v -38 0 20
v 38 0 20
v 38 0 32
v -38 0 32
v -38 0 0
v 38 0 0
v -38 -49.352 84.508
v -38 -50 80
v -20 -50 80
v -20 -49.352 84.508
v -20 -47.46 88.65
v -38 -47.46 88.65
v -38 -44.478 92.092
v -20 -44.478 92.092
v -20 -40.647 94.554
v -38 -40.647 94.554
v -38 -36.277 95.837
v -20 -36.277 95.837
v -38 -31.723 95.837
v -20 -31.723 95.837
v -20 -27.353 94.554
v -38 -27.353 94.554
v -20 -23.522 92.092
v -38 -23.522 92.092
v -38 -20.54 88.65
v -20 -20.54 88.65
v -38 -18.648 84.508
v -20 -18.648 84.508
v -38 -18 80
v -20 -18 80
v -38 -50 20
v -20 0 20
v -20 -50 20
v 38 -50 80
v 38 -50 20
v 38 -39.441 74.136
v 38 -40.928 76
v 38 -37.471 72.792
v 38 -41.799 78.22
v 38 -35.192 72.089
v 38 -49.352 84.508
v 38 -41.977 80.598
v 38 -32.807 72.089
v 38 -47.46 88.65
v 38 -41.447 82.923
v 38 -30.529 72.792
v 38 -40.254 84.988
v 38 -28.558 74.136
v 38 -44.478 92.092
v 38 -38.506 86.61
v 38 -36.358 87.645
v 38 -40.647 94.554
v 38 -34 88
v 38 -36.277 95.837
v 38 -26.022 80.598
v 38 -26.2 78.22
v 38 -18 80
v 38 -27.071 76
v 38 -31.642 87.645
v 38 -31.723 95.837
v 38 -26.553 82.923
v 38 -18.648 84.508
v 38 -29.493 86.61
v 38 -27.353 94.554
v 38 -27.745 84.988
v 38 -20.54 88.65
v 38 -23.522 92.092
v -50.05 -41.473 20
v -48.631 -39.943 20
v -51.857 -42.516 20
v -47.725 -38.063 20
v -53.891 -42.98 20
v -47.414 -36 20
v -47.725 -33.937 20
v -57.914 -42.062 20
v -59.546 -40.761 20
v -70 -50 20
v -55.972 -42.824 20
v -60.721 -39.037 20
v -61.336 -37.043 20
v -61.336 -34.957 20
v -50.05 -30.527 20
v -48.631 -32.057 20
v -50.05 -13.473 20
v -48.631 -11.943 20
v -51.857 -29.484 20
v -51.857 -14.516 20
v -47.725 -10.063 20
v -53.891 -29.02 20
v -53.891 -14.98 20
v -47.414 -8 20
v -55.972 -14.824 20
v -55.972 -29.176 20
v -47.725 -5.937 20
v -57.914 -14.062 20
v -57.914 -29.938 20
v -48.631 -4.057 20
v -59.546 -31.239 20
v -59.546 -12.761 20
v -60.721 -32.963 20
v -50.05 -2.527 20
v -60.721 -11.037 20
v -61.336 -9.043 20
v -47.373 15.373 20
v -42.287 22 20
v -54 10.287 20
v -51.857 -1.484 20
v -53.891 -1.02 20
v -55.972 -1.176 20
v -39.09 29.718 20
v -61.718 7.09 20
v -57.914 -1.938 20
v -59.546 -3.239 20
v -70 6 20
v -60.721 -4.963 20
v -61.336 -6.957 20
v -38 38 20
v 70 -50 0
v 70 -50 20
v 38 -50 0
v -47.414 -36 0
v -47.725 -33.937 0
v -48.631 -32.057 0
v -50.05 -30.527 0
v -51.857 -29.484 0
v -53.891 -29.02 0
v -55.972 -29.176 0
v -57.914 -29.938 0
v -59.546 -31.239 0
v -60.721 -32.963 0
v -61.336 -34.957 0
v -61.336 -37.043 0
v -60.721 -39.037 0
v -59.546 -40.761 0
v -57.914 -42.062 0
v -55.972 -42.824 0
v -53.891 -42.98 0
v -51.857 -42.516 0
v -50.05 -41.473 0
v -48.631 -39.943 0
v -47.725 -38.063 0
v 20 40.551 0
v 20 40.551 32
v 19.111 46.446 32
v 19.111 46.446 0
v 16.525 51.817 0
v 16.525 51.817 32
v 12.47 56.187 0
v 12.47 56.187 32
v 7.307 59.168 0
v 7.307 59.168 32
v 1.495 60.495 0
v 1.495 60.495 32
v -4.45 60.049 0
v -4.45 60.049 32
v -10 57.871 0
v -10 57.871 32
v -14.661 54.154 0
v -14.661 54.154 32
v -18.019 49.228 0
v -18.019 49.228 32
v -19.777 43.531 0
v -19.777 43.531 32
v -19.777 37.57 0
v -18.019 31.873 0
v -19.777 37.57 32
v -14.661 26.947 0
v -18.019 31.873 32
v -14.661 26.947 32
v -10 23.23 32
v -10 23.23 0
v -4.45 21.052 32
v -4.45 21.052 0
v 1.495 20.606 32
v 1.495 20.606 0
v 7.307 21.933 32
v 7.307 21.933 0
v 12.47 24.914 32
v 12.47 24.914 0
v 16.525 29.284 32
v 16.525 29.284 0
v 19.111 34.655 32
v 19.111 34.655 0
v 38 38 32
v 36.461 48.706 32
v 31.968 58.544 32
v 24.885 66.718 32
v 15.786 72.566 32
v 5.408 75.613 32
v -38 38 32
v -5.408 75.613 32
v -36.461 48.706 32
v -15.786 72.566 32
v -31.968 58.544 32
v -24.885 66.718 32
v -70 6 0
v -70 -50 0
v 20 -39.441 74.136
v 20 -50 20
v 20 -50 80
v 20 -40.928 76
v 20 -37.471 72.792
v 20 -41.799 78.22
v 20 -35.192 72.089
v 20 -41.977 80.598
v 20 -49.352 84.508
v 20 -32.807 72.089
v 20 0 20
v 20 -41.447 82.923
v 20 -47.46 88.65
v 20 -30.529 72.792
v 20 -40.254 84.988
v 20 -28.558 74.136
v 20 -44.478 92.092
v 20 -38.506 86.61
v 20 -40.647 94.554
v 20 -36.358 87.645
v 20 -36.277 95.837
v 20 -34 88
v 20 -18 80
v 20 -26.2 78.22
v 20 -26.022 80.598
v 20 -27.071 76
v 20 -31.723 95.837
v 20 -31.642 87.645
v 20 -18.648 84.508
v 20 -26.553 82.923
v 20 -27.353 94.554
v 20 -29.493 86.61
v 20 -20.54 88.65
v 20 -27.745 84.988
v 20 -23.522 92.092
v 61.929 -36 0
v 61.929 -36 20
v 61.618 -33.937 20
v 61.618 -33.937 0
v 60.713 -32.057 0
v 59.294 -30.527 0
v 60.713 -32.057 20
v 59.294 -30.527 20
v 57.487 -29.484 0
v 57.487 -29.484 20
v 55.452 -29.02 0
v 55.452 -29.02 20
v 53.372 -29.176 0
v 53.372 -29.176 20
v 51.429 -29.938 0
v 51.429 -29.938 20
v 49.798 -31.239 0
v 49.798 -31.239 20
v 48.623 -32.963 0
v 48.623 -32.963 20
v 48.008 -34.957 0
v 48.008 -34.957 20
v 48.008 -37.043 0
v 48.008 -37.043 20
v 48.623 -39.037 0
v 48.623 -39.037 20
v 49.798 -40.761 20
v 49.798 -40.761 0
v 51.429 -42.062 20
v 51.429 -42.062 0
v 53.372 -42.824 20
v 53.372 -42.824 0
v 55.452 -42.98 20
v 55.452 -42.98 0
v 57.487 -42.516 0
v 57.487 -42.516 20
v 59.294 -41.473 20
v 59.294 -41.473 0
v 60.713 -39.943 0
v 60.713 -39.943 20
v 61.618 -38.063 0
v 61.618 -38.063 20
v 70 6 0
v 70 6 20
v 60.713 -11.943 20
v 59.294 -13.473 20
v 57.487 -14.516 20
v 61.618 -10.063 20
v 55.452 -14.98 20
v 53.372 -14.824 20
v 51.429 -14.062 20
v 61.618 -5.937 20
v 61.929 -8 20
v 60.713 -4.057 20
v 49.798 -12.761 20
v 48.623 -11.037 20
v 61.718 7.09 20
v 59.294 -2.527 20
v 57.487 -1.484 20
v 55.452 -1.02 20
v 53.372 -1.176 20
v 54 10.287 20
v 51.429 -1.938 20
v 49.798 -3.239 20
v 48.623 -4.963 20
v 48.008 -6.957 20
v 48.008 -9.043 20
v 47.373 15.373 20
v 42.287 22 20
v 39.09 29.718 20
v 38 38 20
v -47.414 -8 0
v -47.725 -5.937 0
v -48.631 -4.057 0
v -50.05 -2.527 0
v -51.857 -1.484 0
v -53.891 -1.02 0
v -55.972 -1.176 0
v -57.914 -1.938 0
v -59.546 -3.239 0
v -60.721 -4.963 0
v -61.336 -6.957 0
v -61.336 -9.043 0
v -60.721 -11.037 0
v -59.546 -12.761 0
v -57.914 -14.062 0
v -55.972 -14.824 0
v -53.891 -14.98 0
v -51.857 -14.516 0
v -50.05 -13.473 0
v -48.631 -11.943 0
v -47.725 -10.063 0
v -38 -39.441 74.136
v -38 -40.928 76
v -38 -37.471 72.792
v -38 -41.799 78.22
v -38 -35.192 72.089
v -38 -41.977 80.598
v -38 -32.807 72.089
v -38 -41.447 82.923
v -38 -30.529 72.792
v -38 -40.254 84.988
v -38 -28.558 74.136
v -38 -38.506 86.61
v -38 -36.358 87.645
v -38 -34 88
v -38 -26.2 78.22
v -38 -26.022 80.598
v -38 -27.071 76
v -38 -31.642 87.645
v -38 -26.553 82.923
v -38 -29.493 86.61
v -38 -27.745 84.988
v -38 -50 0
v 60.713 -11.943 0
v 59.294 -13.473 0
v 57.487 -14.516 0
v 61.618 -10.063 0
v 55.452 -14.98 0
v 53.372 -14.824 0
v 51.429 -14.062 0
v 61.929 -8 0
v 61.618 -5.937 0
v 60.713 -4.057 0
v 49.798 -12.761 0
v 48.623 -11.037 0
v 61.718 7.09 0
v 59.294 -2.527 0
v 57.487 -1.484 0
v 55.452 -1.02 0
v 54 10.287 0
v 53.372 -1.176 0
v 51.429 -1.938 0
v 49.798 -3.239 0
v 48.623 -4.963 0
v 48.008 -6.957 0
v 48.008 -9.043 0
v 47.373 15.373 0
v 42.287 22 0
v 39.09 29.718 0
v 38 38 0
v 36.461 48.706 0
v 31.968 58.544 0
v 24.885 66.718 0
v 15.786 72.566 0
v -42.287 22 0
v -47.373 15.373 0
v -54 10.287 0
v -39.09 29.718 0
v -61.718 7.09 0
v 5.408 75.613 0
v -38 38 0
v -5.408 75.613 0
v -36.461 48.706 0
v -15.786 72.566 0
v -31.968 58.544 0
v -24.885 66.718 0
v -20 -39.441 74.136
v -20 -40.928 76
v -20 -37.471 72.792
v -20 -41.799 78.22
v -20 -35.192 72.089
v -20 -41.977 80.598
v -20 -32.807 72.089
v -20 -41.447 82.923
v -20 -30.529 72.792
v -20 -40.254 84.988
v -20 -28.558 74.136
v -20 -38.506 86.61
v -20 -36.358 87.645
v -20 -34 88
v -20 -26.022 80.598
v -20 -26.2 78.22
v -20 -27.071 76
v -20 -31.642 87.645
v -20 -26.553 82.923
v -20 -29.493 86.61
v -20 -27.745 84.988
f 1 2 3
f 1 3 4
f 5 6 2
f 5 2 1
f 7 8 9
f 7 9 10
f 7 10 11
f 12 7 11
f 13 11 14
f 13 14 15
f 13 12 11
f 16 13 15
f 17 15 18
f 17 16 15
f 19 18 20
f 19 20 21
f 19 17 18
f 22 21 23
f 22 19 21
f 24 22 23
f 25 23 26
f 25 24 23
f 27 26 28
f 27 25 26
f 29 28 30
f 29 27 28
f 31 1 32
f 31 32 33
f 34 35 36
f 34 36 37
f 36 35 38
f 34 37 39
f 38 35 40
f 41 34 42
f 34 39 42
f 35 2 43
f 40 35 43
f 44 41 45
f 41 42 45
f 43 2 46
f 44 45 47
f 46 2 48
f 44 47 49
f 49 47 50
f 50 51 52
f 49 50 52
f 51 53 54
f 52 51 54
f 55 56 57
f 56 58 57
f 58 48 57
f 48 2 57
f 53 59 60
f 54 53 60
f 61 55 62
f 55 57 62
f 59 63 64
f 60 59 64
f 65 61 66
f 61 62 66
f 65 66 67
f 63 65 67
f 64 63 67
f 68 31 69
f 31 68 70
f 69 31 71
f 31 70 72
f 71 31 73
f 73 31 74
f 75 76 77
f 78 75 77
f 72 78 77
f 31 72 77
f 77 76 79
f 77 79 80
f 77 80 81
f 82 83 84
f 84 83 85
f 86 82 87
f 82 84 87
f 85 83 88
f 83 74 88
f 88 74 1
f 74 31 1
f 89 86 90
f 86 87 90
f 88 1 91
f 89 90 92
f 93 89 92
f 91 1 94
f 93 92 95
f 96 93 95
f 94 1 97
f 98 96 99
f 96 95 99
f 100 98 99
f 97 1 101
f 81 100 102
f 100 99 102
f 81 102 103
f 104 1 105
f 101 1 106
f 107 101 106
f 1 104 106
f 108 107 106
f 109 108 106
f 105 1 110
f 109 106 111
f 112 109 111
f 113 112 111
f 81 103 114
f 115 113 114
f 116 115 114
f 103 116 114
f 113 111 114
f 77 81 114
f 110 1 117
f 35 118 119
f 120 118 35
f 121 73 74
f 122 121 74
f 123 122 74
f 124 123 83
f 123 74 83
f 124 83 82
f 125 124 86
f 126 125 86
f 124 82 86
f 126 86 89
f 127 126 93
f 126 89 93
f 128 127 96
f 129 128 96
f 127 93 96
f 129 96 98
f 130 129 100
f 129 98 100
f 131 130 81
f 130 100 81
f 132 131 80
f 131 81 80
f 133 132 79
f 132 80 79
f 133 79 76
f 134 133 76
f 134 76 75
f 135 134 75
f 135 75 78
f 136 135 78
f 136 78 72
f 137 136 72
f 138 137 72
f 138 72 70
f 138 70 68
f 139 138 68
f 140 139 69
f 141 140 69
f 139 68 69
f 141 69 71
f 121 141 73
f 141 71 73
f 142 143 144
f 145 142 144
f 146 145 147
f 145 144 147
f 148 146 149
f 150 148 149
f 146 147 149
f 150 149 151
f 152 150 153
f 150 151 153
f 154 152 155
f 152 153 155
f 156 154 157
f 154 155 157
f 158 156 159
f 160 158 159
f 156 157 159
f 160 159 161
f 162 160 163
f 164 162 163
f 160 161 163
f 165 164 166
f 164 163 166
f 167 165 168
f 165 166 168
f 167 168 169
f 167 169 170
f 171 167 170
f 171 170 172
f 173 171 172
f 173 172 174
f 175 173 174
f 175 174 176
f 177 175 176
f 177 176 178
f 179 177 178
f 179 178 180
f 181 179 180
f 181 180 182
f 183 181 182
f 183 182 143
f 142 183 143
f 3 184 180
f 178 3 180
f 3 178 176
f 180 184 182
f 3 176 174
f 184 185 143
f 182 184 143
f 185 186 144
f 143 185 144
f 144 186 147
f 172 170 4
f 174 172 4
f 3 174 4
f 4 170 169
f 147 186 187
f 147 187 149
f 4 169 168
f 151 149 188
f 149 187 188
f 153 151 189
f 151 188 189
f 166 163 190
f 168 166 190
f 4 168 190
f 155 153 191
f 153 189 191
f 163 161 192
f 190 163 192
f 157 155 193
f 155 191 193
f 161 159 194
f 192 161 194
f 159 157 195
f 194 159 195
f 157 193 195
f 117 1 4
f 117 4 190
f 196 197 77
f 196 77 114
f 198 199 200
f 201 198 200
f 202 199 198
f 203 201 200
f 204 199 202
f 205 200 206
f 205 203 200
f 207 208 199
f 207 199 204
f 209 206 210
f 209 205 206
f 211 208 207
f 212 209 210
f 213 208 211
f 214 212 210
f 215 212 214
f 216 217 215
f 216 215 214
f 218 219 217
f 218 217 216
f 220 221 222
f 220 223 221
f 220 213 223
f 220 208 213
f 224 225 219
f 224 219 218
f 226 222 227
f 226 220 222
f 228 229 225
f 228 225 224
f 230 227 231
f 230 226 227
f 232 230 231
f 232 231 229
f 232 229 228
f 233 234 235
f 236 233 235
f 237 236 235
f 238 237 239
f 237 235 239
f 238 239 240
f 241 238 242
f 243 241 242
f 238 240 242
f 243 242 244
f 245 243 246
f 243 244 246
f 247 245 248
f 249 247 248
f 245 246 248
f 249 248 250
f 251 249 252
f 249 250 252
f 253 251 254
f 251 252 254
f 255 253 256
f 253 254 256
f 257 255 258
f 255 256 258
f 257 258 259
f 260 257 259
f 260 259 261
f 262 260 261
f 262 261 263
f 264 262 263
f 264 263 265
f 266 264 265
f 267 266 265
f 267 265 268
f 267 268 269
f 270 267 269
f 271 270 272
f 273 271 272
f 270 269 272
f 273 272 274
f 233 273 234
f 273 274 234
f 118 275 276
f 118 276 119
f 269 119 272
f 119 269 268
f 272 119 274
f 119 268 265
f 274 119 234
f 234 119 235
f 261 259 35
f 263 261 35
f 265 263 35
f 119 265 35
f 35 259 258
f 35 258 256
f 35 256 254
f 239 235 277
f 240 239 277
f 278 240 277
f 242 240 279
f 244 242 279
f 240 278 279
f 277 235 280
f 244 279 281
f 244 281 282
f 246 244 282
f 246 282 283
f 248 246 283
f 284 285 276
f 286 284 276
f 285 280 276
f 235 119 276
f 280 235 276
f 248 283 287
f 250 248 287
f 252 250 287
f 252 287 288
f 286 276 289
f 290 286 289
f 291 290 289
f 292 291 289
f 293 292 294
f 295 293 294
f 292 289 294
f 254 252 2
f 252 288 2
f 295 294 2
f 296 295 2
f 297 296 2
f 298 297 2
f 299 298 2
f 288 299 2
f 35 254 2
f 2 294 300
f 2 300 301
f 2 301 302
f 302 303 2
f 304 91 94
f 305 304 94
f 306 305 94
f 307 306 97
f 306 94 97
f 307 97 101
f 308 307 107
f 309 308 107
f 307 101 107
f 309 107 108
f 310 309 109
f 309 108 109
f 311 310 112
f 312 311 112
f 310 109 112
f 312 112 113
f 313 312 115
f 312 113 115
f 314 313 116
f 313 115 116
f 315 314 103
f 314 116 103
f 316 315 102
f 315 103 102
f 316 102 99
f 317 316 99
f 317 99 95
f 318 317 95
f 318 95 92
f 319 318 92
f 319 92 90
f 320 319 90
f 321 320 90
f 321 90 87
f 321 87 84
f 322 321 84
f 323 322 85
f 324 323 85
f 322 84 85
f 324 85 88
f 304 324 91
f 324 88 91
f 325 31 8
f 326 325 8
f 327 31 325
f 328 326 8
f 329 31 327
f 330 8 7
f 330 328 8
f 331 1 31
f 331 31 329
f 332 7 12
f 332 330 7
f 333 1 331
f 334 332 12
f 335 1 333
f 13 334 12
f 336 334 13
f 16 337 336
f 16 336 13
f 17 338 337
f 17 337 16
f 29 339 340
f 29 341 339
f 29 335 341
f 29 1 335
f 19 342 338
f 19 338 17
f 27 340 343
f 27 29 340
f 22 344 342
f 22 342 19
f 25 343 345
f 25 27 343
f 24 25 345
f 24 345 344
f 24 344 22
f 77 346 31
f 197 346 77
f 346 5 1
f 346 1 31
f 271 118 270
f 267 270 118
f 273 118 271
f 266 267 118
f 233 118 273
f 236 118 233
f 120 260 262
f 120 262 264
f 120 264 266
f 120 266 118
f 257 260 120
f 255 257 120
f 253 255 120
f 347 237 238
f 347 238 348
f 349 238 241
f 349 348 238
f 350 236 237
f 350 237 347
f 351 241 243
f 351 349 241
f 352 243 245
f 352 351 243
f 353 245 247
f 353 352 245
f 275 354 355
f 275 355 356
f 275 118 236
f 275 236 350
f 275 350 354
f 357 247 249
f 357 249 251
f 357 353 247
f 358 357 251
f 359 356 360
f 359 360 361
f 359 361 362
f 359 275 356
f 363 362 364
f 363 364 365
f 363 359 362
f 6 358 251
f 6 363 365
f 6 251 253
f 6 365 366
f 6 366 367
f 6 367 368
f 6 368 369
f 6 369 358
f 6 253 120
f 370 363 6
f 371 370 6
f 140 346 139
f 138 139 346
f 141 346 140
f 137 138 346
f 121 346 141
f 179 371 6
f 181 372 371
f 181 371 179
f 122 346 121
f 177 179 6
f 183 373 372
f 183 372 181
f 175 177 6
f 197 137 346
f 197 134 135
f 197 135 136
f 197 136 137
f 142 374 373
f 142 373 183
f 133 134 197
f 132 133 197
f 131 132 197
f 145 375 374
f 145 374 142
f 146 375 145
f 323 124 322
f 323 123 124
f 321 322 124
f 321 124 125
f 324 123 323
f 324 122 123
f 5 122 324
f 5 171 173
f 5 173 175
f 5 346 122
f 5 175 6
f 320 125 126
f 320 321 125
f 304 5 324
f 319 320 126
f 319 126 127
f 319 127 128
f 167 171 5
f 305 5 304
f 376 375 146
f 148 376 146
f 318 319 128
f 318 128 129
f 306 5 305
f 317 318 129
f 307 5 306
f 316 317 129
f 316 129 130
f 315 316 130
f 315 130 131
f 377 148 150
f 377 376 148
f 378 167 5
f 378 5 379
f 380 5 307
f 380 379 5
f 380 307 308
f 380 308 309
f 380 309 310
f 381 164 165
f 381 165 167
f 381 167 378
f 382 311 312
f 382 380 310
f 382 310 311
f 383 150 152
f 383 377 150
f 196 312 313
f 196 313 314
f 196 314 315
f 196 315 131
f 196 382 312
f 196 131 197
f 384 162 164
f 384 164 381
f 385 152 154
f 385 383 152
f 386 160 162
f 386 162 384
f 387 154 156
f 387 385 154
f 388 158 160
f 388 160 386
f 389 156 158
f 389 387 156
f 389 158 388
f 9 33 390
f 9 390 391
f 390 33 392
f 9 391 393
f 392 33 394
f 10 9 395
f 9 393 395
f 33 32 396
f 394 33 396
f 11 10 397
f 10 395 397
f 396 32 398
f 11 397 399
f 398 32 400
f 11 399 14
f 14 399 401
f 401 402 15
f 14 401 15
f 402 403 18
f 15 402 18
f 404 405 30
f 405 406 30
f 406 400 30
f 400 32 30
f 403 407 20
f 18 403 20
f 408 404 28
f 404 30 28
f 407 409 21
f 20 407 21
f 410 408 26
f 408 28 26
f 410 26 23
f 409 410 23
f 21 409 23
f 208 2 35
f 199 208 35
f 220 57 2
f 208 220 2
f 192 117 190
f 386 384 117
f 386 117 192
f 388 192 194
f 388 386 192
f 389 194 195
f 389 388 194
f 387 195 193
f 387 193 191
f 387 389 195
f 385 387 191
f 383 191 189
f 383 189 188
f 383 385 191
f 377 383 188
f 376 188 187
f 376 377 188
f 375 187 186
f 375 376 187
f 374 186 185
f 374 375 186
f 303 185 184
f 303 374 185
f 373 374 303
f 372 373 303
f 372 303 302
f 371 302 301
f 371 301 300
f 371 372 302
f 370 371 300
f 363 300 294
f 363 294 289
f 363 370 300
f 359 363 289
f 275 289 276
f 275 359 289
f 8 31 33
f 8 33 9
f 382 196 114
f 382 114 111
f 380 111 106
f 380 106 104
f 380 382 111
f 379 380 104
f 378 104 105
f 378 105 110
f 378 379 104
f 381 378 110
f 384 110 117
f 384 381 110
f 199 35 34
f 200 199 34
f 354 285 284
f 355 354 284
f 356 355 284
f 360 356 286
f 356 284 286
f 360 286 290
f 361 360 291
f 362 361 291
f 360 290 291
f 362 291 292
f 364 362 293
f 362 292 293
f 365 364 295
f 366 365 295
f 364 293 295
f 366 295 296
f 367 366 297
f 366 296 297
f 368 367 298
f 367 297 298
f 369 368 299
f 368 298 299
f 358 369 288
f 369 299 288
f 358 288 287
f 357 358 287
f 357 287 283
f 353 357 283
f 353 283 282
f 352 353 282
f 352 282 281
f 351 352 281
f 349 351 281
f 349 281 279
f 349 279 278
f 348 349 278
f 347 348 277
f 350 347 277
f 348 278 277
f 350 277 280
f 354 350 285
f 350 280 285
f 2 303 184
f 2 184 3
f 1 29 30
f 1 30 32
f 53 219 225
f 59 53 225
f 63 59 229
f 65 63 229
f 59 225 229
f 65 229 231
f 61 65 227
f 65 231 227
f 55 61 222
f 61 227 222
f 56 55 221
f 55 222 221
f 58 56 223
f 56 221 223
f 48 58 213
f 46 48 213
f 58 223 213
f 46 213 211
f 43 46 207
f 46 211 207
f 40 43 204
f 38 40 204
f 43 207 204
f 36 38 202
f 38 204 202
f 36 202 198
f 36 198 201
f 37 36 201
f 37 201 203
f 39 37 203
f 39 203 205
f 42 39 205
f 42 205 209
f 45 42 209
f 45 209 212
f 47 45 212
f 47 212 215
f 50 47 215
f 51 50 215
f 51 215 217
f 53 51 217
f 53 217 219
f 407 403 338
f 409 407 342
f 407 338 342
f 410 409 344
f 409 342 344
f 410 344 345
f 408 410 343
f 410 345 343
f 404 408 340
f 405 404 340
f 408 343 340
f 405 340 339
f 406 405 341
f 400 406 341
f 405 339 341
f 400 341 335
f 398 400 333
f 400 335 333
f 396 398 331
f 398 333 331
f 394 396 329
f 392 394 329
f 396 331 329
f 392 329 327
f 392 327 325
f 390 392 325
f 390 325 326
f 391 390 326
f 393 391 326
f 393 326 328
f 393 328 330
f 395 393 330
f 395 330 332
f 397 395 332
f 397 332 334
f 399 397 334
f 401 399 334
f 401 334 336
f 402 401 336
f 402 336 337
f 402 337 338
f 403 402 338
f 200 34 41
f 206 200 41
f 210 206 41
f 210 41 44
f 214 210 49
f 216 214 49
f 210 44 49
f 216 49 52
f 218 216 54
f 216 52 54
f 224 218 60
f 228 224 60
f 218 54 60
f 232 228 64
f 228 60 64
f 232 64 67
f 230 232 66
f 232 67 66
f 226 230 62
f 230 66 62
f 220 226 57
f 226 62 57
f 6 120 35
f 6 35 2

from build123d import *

# Parameters (mm, degrees)
BOSS_EXTRUDE1_DEPTH = 32
BOSS_EXTRUDE2_DEPTH = 20
SKETCH2_R           = 7
CUT_EXTRUDE1_DEPTH  = 20
SKETCH3_R           = 20
CUT_EXTRUDE3_DEPTH  = 109.166538264
BOSS_EXTRUDE3_DEPTH = 18
BOSS_EXTRUDE4_DEPTH = 18
SKETCH6_R           = 8
CUT_EXTRUDE4_DEPTH  = 164.266653056


with BuildPart() as part:
    # Sketch1 → Boss-Extrude1 (new body)
    with BuildSketch(Plane.XY):
        with BuildLine():
            Line((-38, 38), (-38, 0))
            Line((-38, 0), (38, 0))
            Line((38, 0), (38, 38))
            ThreePointArc((38, 38), (0, 76), (-38, 38))
        make_face()
    extrude(amount=BOSS_EXTRUDE1_DEPTH)

    # Sketch1<3> → Boss-Extrude2 (add)
    with BuildSketch(Plane.XY):
        with BuildLine():
            Line((-38, -50), (-38, 38))
            ThreePointArc((-38, 38), (-47.372583002, 15.372583002), (-70, 6))
            Line((-70, 6), (-70, -50))
            Line((-70, -50), (-38, -50))
        make_face()
        with BuildLine():
            Line((38, 38), (38, -50))
            Line((38, -50), (70, -50))
            Line((70, -50), (70, 6))
            ThreePointArc((70, 6), (47.372583002, 15.372583002), (38, 38))
        make_face()
    extrude(amount=BOSS_EXTRUDE2_DEPTH)

    # Sketch2 → Cut-Extrude1 (cut)
    with BuildSketch(Plane.XY.offset(20)):
        with Locations((-54.414414875, -8)):
            Circle(SKETCH2_R)
        with Locations((-54.414414875, -36)):
            Circle(SKETCH2_R)
        with Locations((54.929377791, -8)):
            Circle(SKETCH2_R)
        with Locations((54.929377791, -36)):
            Circle(SKETCH2_R)
    extrude(amount=-CUT_EXTRUDE1_DEPTH, mode=Mode.SUBTRACT)

    # Sketch3 → Cut-Extrude3 (cut, through all)
    with BuildSketch(Plane.XY.offset(32)):
        with Locations((0, 40.550516049)):
            Circle(SKETCH3_R)
    extrude(amount=-CUT_EXTRUDE3_DEPTH, mode=Mode.SUBTRACT)


with BuildPart() as body_2:
    # Sketch4 → Boss-Extrude3 (new body)
    with BuildSketch(Plane(origin=(-38, 0, 0), x_dir=(0, 0, -1), z_dir=(1, 0, 0))):
        with BuildLine():
            Line((-20, -50), (-80, -50))
            ThreePointArc((-80, -50), (-96, -34), (-80, -18))
            Line((-80, -18), (-20, 0))
            Line((-20, 0), (-20, -50))
        make_face()
    extrude(amount=BOSS_EXTRUDE3_DEPTH)


with BuildPart() as body_3:
    # Sketch5 → Boss-Extrude4 (new body)
    with BuildSketch(Plane.ZY.offset(-38)):
        with BuildLine():
            Line((20, -50), (80, -50))
            ThreePointArc((80, -50), (96, -34), (80, -18))
            Line((80, -18), (20, 0))
            Line((20, 0), (20, -50))
        make_face()
    extrude(amount=BOSS_EXTRUDE4_DEPTH)


with BuildPart() as cut_extrude4_tool:
    # Sketch6 → Cut-Extrude4 (new, through all)
    with BuildSketch(Plane.ZY.offset(38)):
        with Locations((80, -33.999616417)):
            Circle(SKETCH6_R)
    extrude(amount=-CUT_EXTRUDE4_DEPTH)


with BuildPart() as body_2_1:
    add(body_2.part)

    # Cut-Extrude4: cut by cut_extrude4_tool
    add(cut_extrude4_tool.part, mode=Mode.SUBTRACT)


with BuildPart() as body_3_1:
    add(body_3.part)

    # Cut-Extrude4: cut by cut_extrude4_tool
    add(cut_extrude4_tool.part, mode=Mode.SUBTRACT)


solid = Compound([part.part, body_2_1.part, body_3_1.part])
